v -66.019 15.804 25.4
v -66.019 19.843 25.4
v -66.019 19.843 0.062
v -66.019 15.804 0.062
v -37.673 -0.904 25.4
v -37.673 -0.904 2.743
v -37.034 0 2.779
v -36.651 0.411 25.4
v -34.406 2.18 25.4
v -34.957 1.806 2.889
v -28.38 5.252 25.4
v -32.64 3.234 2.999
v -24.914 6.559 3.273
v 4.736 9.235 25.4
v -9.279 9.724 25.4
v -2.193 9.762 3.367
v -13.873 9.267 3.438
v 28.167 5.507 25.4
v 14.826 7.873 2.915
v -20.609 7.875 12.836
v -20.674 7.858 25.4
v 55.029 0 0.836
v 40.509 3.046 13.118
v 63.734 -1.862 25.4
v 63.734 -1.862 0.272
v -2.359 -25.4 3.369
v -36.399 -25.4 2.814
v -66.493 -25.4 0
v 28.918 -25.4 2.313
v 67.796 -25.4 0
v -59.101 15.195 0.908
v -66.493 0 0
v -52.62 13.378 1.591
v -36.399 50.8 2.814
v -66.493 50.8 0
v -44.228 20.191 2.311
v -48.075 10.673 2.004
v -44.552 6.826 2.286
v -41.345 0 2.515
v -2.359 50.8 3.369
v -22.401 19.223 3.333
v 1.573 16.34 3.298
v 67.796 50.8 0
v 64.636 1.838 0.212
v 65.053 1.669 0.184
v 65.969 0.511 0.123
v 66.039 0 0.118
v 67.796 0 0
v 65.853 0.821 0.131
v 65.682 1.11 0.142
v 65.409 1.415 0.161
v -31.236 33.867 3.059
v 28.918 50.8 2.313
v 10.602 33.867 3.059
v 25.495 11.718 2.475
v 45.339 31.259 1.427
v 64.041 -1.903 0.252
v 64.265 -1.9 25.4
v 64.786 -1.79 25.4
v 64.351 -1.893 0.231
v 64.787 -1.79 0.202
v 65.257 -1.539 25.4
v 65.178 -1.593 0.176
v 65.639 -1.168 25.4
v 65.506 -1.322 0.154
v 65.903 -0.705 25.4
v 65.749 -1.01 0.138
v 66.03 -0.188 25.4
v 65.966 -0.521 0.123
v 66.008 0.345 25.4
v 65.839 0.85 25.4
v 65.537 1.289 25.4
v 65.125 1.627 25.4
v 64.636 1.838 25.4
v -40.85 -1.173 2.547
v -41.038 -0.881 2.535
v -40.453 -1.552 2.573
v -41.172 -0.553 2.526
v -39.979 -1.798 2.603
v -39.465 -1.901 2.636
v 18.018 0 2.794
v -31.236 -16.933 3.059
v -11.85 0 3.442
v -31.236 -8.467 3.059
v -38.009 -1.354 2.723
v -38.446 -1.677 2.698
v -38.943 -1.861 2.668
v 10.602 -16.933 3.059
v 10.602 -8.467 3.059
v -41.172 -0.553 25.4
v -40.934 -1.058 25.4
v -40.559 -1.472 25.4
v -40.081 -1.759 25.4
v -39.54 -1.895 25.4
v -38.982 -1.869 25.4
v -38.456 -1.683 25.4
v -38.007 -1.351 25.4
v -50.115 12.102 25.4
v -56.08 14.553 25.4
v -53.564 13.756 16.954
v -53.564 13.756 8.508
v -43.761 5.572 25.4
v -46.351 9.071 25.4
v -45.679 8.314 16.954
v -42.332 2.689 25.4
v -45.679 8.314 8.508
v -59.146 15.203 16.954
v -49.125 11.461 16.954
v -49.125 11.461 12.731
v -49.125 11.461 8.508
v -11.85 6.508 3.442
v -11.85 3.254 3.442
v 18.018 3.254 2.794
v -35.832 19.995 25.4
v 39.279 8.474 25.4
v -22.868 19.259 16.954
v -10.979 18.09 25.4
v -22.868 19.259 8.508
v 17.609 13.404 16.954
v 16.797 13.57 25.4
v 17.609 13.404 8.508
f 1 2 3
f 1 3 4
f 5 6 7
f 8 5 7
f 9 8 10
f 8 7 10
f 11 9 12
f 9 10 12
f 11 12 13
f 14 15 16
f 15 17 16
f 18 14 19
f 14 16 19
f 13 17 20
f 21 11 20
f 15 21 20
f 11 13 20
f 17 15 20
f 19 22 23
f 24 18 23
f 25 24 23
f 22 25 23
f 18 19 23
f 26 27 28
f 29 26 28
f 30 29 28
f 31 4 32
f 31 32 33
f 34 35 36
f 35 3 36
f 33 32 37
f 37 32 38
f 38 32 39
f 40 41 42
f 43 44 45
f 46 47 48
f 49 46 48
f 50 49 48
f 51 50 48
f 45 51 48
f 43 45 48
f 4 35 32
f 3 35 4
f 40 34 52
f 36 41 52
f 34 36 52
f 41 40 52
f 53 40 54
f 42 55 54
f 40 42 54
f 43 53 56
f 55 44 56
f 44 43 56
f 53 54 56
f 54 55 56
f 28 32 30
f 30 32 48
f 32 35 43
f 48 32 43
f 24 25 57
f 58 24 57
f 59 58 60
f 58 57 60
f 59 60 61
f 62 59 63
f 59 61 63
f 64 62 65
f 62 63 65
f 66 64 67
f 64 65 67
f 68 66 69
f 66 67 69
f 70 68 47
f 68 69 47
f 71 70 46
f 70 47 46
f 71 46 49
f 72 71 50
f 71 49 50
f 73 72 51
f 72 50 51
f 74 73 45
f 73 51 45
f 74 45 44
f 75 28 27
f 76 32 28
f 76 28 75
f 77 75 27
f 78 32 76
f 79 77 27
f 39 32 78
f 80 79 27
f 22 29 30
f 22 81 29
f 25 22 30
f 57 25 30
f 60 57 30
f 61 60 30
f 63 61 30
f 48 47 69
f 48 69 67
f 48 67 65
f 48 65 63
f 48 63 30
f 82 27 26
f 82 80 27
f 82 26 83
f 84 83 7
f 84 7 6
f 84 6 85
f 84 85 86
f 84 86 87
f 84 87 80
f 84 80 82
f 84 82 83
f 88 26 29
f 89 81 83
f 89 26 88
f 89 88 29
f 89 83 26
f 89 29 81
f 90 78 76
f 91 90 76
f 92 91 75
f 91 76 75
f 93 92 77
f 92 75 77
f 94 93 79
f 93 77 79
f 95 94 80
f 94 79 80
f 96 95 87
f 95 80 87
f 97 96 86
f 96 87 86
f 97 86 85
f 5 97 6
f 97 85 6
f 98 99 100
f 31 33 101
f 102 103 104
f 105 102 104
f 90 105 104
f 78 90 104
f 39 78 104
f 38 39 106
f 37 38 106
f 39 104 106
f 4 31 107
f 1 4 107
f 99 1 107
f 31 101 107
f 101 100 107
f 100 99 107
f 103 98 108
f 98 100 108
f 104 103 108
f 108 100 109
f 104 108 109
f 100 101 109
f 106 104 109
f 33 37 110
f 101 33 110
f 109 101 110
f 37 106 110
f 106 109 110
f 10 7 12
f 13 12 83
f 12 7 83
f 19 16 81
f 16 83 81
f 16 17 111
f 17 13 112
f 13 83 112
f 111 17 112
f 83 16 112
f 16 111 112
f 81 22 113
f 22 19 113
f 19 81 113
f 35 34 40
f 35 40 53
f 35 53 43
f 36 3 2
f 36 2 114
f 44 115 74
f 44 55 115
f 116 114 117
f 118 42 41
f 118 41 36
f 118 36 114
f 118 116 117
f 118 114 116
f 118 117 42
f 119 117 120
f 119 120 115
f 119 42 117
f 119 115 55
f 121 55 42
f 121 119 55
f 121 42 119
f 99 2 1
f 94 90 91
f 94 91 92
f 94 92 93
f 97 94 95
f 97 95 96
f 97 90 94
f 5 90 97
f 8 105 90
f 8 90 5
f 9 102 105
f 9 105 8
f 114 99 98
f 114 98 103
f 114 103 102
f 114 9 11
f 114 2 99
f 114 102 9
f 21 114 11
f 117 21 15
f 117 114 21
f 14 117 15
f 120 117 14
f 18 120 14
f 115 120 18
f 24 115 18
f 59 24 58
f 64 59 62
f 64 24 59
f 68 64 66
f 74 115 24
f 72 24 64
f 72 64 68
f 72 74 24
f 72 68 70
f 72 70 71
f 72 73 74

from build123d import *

# Parameters (mm, degrees)
F2_DEPTH      = 25.4
F2_DEPTH_BACK = 50.8
F3_DEPTH      = 25.4


with BuildPart() as f2:
    # F1 (on Front) → F2 (new body, two sides)
    with BuildSketch(Plane.XZ) as f2_sk:
        with BuildLine():
            add(Edge.make_bspline(
                [(-66.493101418, 0), (-31.6023416817, 4.5892358758), (0, 4.5892358758), (67.7957311273, 0)],
                knots=[0, 0, 0, 0, 134.2888325453, 134.2888325453, 134.2888325453, 134.2888325453], degree=3))
            Line((-66.493101418, 0), (67.7957311273, 0))
        make_face()
    extrude(amount=F2_DEPTH)
    extrude(f2_sk.sketch, amount=-F2_DEPTH_BACK)

    # F0 (on Top) → F3 (join)
    with BuildSketch(Plane.XY):
        with BuildLine():
            add(Edge.make_bspline(
                [(-66.0190582275, 15.8042479306), (-50.882216543, 15.443845652), (-44.3860767732, 10.0356803936), (-41.1722754867, -0.5532574777)],
                knots=[0, 0, 0, 0, 29.7477830393, 29.7477830393, 29.7477830393, 29.7477830393], degree=3))
            ThreePointArc((-41.1722754867, -0.5532574777), (-39.5395729632, -1.8954823631), (-37.6727509093, -0.9043917556))
            add(Edge.make_bspline(
                [(-37.6727509093, -0.9043917556), (-35.9554500646, 2.279277761), (-11.7834584129, 13.3395817627), (10.1645017819, 9.6475739081), (63.7337581556, -1.8624929201)],
                knots=[0, 0, 0, 0, 0.3222291325, 1, 1, 1, 1], degree=3))
            ThreePointArc((63.7337581556, -1.8624929201), (65.9847645302, -0.4510784554), (64.6355761504, 1.8377664946))
            add(Edge.make_bspline(
                [(-66.0190582275, 19.8427634791), (-18.4567762815, 21.7484285157), (11.260919046, 16.4069097143), (64.6355761504, 1.8377664946)],
                knots=[0, 0, 0, 0, 131.8893983641, 131.8893983641, 131.8893983641, 131.8893983641], degree=3))
            Line((-66.0190582275, 19.8427634791), (-66.0190582275, 15.8042479306))
        make_face()
    extrude(amount=F3_DEPTH)


solid = f2.part
